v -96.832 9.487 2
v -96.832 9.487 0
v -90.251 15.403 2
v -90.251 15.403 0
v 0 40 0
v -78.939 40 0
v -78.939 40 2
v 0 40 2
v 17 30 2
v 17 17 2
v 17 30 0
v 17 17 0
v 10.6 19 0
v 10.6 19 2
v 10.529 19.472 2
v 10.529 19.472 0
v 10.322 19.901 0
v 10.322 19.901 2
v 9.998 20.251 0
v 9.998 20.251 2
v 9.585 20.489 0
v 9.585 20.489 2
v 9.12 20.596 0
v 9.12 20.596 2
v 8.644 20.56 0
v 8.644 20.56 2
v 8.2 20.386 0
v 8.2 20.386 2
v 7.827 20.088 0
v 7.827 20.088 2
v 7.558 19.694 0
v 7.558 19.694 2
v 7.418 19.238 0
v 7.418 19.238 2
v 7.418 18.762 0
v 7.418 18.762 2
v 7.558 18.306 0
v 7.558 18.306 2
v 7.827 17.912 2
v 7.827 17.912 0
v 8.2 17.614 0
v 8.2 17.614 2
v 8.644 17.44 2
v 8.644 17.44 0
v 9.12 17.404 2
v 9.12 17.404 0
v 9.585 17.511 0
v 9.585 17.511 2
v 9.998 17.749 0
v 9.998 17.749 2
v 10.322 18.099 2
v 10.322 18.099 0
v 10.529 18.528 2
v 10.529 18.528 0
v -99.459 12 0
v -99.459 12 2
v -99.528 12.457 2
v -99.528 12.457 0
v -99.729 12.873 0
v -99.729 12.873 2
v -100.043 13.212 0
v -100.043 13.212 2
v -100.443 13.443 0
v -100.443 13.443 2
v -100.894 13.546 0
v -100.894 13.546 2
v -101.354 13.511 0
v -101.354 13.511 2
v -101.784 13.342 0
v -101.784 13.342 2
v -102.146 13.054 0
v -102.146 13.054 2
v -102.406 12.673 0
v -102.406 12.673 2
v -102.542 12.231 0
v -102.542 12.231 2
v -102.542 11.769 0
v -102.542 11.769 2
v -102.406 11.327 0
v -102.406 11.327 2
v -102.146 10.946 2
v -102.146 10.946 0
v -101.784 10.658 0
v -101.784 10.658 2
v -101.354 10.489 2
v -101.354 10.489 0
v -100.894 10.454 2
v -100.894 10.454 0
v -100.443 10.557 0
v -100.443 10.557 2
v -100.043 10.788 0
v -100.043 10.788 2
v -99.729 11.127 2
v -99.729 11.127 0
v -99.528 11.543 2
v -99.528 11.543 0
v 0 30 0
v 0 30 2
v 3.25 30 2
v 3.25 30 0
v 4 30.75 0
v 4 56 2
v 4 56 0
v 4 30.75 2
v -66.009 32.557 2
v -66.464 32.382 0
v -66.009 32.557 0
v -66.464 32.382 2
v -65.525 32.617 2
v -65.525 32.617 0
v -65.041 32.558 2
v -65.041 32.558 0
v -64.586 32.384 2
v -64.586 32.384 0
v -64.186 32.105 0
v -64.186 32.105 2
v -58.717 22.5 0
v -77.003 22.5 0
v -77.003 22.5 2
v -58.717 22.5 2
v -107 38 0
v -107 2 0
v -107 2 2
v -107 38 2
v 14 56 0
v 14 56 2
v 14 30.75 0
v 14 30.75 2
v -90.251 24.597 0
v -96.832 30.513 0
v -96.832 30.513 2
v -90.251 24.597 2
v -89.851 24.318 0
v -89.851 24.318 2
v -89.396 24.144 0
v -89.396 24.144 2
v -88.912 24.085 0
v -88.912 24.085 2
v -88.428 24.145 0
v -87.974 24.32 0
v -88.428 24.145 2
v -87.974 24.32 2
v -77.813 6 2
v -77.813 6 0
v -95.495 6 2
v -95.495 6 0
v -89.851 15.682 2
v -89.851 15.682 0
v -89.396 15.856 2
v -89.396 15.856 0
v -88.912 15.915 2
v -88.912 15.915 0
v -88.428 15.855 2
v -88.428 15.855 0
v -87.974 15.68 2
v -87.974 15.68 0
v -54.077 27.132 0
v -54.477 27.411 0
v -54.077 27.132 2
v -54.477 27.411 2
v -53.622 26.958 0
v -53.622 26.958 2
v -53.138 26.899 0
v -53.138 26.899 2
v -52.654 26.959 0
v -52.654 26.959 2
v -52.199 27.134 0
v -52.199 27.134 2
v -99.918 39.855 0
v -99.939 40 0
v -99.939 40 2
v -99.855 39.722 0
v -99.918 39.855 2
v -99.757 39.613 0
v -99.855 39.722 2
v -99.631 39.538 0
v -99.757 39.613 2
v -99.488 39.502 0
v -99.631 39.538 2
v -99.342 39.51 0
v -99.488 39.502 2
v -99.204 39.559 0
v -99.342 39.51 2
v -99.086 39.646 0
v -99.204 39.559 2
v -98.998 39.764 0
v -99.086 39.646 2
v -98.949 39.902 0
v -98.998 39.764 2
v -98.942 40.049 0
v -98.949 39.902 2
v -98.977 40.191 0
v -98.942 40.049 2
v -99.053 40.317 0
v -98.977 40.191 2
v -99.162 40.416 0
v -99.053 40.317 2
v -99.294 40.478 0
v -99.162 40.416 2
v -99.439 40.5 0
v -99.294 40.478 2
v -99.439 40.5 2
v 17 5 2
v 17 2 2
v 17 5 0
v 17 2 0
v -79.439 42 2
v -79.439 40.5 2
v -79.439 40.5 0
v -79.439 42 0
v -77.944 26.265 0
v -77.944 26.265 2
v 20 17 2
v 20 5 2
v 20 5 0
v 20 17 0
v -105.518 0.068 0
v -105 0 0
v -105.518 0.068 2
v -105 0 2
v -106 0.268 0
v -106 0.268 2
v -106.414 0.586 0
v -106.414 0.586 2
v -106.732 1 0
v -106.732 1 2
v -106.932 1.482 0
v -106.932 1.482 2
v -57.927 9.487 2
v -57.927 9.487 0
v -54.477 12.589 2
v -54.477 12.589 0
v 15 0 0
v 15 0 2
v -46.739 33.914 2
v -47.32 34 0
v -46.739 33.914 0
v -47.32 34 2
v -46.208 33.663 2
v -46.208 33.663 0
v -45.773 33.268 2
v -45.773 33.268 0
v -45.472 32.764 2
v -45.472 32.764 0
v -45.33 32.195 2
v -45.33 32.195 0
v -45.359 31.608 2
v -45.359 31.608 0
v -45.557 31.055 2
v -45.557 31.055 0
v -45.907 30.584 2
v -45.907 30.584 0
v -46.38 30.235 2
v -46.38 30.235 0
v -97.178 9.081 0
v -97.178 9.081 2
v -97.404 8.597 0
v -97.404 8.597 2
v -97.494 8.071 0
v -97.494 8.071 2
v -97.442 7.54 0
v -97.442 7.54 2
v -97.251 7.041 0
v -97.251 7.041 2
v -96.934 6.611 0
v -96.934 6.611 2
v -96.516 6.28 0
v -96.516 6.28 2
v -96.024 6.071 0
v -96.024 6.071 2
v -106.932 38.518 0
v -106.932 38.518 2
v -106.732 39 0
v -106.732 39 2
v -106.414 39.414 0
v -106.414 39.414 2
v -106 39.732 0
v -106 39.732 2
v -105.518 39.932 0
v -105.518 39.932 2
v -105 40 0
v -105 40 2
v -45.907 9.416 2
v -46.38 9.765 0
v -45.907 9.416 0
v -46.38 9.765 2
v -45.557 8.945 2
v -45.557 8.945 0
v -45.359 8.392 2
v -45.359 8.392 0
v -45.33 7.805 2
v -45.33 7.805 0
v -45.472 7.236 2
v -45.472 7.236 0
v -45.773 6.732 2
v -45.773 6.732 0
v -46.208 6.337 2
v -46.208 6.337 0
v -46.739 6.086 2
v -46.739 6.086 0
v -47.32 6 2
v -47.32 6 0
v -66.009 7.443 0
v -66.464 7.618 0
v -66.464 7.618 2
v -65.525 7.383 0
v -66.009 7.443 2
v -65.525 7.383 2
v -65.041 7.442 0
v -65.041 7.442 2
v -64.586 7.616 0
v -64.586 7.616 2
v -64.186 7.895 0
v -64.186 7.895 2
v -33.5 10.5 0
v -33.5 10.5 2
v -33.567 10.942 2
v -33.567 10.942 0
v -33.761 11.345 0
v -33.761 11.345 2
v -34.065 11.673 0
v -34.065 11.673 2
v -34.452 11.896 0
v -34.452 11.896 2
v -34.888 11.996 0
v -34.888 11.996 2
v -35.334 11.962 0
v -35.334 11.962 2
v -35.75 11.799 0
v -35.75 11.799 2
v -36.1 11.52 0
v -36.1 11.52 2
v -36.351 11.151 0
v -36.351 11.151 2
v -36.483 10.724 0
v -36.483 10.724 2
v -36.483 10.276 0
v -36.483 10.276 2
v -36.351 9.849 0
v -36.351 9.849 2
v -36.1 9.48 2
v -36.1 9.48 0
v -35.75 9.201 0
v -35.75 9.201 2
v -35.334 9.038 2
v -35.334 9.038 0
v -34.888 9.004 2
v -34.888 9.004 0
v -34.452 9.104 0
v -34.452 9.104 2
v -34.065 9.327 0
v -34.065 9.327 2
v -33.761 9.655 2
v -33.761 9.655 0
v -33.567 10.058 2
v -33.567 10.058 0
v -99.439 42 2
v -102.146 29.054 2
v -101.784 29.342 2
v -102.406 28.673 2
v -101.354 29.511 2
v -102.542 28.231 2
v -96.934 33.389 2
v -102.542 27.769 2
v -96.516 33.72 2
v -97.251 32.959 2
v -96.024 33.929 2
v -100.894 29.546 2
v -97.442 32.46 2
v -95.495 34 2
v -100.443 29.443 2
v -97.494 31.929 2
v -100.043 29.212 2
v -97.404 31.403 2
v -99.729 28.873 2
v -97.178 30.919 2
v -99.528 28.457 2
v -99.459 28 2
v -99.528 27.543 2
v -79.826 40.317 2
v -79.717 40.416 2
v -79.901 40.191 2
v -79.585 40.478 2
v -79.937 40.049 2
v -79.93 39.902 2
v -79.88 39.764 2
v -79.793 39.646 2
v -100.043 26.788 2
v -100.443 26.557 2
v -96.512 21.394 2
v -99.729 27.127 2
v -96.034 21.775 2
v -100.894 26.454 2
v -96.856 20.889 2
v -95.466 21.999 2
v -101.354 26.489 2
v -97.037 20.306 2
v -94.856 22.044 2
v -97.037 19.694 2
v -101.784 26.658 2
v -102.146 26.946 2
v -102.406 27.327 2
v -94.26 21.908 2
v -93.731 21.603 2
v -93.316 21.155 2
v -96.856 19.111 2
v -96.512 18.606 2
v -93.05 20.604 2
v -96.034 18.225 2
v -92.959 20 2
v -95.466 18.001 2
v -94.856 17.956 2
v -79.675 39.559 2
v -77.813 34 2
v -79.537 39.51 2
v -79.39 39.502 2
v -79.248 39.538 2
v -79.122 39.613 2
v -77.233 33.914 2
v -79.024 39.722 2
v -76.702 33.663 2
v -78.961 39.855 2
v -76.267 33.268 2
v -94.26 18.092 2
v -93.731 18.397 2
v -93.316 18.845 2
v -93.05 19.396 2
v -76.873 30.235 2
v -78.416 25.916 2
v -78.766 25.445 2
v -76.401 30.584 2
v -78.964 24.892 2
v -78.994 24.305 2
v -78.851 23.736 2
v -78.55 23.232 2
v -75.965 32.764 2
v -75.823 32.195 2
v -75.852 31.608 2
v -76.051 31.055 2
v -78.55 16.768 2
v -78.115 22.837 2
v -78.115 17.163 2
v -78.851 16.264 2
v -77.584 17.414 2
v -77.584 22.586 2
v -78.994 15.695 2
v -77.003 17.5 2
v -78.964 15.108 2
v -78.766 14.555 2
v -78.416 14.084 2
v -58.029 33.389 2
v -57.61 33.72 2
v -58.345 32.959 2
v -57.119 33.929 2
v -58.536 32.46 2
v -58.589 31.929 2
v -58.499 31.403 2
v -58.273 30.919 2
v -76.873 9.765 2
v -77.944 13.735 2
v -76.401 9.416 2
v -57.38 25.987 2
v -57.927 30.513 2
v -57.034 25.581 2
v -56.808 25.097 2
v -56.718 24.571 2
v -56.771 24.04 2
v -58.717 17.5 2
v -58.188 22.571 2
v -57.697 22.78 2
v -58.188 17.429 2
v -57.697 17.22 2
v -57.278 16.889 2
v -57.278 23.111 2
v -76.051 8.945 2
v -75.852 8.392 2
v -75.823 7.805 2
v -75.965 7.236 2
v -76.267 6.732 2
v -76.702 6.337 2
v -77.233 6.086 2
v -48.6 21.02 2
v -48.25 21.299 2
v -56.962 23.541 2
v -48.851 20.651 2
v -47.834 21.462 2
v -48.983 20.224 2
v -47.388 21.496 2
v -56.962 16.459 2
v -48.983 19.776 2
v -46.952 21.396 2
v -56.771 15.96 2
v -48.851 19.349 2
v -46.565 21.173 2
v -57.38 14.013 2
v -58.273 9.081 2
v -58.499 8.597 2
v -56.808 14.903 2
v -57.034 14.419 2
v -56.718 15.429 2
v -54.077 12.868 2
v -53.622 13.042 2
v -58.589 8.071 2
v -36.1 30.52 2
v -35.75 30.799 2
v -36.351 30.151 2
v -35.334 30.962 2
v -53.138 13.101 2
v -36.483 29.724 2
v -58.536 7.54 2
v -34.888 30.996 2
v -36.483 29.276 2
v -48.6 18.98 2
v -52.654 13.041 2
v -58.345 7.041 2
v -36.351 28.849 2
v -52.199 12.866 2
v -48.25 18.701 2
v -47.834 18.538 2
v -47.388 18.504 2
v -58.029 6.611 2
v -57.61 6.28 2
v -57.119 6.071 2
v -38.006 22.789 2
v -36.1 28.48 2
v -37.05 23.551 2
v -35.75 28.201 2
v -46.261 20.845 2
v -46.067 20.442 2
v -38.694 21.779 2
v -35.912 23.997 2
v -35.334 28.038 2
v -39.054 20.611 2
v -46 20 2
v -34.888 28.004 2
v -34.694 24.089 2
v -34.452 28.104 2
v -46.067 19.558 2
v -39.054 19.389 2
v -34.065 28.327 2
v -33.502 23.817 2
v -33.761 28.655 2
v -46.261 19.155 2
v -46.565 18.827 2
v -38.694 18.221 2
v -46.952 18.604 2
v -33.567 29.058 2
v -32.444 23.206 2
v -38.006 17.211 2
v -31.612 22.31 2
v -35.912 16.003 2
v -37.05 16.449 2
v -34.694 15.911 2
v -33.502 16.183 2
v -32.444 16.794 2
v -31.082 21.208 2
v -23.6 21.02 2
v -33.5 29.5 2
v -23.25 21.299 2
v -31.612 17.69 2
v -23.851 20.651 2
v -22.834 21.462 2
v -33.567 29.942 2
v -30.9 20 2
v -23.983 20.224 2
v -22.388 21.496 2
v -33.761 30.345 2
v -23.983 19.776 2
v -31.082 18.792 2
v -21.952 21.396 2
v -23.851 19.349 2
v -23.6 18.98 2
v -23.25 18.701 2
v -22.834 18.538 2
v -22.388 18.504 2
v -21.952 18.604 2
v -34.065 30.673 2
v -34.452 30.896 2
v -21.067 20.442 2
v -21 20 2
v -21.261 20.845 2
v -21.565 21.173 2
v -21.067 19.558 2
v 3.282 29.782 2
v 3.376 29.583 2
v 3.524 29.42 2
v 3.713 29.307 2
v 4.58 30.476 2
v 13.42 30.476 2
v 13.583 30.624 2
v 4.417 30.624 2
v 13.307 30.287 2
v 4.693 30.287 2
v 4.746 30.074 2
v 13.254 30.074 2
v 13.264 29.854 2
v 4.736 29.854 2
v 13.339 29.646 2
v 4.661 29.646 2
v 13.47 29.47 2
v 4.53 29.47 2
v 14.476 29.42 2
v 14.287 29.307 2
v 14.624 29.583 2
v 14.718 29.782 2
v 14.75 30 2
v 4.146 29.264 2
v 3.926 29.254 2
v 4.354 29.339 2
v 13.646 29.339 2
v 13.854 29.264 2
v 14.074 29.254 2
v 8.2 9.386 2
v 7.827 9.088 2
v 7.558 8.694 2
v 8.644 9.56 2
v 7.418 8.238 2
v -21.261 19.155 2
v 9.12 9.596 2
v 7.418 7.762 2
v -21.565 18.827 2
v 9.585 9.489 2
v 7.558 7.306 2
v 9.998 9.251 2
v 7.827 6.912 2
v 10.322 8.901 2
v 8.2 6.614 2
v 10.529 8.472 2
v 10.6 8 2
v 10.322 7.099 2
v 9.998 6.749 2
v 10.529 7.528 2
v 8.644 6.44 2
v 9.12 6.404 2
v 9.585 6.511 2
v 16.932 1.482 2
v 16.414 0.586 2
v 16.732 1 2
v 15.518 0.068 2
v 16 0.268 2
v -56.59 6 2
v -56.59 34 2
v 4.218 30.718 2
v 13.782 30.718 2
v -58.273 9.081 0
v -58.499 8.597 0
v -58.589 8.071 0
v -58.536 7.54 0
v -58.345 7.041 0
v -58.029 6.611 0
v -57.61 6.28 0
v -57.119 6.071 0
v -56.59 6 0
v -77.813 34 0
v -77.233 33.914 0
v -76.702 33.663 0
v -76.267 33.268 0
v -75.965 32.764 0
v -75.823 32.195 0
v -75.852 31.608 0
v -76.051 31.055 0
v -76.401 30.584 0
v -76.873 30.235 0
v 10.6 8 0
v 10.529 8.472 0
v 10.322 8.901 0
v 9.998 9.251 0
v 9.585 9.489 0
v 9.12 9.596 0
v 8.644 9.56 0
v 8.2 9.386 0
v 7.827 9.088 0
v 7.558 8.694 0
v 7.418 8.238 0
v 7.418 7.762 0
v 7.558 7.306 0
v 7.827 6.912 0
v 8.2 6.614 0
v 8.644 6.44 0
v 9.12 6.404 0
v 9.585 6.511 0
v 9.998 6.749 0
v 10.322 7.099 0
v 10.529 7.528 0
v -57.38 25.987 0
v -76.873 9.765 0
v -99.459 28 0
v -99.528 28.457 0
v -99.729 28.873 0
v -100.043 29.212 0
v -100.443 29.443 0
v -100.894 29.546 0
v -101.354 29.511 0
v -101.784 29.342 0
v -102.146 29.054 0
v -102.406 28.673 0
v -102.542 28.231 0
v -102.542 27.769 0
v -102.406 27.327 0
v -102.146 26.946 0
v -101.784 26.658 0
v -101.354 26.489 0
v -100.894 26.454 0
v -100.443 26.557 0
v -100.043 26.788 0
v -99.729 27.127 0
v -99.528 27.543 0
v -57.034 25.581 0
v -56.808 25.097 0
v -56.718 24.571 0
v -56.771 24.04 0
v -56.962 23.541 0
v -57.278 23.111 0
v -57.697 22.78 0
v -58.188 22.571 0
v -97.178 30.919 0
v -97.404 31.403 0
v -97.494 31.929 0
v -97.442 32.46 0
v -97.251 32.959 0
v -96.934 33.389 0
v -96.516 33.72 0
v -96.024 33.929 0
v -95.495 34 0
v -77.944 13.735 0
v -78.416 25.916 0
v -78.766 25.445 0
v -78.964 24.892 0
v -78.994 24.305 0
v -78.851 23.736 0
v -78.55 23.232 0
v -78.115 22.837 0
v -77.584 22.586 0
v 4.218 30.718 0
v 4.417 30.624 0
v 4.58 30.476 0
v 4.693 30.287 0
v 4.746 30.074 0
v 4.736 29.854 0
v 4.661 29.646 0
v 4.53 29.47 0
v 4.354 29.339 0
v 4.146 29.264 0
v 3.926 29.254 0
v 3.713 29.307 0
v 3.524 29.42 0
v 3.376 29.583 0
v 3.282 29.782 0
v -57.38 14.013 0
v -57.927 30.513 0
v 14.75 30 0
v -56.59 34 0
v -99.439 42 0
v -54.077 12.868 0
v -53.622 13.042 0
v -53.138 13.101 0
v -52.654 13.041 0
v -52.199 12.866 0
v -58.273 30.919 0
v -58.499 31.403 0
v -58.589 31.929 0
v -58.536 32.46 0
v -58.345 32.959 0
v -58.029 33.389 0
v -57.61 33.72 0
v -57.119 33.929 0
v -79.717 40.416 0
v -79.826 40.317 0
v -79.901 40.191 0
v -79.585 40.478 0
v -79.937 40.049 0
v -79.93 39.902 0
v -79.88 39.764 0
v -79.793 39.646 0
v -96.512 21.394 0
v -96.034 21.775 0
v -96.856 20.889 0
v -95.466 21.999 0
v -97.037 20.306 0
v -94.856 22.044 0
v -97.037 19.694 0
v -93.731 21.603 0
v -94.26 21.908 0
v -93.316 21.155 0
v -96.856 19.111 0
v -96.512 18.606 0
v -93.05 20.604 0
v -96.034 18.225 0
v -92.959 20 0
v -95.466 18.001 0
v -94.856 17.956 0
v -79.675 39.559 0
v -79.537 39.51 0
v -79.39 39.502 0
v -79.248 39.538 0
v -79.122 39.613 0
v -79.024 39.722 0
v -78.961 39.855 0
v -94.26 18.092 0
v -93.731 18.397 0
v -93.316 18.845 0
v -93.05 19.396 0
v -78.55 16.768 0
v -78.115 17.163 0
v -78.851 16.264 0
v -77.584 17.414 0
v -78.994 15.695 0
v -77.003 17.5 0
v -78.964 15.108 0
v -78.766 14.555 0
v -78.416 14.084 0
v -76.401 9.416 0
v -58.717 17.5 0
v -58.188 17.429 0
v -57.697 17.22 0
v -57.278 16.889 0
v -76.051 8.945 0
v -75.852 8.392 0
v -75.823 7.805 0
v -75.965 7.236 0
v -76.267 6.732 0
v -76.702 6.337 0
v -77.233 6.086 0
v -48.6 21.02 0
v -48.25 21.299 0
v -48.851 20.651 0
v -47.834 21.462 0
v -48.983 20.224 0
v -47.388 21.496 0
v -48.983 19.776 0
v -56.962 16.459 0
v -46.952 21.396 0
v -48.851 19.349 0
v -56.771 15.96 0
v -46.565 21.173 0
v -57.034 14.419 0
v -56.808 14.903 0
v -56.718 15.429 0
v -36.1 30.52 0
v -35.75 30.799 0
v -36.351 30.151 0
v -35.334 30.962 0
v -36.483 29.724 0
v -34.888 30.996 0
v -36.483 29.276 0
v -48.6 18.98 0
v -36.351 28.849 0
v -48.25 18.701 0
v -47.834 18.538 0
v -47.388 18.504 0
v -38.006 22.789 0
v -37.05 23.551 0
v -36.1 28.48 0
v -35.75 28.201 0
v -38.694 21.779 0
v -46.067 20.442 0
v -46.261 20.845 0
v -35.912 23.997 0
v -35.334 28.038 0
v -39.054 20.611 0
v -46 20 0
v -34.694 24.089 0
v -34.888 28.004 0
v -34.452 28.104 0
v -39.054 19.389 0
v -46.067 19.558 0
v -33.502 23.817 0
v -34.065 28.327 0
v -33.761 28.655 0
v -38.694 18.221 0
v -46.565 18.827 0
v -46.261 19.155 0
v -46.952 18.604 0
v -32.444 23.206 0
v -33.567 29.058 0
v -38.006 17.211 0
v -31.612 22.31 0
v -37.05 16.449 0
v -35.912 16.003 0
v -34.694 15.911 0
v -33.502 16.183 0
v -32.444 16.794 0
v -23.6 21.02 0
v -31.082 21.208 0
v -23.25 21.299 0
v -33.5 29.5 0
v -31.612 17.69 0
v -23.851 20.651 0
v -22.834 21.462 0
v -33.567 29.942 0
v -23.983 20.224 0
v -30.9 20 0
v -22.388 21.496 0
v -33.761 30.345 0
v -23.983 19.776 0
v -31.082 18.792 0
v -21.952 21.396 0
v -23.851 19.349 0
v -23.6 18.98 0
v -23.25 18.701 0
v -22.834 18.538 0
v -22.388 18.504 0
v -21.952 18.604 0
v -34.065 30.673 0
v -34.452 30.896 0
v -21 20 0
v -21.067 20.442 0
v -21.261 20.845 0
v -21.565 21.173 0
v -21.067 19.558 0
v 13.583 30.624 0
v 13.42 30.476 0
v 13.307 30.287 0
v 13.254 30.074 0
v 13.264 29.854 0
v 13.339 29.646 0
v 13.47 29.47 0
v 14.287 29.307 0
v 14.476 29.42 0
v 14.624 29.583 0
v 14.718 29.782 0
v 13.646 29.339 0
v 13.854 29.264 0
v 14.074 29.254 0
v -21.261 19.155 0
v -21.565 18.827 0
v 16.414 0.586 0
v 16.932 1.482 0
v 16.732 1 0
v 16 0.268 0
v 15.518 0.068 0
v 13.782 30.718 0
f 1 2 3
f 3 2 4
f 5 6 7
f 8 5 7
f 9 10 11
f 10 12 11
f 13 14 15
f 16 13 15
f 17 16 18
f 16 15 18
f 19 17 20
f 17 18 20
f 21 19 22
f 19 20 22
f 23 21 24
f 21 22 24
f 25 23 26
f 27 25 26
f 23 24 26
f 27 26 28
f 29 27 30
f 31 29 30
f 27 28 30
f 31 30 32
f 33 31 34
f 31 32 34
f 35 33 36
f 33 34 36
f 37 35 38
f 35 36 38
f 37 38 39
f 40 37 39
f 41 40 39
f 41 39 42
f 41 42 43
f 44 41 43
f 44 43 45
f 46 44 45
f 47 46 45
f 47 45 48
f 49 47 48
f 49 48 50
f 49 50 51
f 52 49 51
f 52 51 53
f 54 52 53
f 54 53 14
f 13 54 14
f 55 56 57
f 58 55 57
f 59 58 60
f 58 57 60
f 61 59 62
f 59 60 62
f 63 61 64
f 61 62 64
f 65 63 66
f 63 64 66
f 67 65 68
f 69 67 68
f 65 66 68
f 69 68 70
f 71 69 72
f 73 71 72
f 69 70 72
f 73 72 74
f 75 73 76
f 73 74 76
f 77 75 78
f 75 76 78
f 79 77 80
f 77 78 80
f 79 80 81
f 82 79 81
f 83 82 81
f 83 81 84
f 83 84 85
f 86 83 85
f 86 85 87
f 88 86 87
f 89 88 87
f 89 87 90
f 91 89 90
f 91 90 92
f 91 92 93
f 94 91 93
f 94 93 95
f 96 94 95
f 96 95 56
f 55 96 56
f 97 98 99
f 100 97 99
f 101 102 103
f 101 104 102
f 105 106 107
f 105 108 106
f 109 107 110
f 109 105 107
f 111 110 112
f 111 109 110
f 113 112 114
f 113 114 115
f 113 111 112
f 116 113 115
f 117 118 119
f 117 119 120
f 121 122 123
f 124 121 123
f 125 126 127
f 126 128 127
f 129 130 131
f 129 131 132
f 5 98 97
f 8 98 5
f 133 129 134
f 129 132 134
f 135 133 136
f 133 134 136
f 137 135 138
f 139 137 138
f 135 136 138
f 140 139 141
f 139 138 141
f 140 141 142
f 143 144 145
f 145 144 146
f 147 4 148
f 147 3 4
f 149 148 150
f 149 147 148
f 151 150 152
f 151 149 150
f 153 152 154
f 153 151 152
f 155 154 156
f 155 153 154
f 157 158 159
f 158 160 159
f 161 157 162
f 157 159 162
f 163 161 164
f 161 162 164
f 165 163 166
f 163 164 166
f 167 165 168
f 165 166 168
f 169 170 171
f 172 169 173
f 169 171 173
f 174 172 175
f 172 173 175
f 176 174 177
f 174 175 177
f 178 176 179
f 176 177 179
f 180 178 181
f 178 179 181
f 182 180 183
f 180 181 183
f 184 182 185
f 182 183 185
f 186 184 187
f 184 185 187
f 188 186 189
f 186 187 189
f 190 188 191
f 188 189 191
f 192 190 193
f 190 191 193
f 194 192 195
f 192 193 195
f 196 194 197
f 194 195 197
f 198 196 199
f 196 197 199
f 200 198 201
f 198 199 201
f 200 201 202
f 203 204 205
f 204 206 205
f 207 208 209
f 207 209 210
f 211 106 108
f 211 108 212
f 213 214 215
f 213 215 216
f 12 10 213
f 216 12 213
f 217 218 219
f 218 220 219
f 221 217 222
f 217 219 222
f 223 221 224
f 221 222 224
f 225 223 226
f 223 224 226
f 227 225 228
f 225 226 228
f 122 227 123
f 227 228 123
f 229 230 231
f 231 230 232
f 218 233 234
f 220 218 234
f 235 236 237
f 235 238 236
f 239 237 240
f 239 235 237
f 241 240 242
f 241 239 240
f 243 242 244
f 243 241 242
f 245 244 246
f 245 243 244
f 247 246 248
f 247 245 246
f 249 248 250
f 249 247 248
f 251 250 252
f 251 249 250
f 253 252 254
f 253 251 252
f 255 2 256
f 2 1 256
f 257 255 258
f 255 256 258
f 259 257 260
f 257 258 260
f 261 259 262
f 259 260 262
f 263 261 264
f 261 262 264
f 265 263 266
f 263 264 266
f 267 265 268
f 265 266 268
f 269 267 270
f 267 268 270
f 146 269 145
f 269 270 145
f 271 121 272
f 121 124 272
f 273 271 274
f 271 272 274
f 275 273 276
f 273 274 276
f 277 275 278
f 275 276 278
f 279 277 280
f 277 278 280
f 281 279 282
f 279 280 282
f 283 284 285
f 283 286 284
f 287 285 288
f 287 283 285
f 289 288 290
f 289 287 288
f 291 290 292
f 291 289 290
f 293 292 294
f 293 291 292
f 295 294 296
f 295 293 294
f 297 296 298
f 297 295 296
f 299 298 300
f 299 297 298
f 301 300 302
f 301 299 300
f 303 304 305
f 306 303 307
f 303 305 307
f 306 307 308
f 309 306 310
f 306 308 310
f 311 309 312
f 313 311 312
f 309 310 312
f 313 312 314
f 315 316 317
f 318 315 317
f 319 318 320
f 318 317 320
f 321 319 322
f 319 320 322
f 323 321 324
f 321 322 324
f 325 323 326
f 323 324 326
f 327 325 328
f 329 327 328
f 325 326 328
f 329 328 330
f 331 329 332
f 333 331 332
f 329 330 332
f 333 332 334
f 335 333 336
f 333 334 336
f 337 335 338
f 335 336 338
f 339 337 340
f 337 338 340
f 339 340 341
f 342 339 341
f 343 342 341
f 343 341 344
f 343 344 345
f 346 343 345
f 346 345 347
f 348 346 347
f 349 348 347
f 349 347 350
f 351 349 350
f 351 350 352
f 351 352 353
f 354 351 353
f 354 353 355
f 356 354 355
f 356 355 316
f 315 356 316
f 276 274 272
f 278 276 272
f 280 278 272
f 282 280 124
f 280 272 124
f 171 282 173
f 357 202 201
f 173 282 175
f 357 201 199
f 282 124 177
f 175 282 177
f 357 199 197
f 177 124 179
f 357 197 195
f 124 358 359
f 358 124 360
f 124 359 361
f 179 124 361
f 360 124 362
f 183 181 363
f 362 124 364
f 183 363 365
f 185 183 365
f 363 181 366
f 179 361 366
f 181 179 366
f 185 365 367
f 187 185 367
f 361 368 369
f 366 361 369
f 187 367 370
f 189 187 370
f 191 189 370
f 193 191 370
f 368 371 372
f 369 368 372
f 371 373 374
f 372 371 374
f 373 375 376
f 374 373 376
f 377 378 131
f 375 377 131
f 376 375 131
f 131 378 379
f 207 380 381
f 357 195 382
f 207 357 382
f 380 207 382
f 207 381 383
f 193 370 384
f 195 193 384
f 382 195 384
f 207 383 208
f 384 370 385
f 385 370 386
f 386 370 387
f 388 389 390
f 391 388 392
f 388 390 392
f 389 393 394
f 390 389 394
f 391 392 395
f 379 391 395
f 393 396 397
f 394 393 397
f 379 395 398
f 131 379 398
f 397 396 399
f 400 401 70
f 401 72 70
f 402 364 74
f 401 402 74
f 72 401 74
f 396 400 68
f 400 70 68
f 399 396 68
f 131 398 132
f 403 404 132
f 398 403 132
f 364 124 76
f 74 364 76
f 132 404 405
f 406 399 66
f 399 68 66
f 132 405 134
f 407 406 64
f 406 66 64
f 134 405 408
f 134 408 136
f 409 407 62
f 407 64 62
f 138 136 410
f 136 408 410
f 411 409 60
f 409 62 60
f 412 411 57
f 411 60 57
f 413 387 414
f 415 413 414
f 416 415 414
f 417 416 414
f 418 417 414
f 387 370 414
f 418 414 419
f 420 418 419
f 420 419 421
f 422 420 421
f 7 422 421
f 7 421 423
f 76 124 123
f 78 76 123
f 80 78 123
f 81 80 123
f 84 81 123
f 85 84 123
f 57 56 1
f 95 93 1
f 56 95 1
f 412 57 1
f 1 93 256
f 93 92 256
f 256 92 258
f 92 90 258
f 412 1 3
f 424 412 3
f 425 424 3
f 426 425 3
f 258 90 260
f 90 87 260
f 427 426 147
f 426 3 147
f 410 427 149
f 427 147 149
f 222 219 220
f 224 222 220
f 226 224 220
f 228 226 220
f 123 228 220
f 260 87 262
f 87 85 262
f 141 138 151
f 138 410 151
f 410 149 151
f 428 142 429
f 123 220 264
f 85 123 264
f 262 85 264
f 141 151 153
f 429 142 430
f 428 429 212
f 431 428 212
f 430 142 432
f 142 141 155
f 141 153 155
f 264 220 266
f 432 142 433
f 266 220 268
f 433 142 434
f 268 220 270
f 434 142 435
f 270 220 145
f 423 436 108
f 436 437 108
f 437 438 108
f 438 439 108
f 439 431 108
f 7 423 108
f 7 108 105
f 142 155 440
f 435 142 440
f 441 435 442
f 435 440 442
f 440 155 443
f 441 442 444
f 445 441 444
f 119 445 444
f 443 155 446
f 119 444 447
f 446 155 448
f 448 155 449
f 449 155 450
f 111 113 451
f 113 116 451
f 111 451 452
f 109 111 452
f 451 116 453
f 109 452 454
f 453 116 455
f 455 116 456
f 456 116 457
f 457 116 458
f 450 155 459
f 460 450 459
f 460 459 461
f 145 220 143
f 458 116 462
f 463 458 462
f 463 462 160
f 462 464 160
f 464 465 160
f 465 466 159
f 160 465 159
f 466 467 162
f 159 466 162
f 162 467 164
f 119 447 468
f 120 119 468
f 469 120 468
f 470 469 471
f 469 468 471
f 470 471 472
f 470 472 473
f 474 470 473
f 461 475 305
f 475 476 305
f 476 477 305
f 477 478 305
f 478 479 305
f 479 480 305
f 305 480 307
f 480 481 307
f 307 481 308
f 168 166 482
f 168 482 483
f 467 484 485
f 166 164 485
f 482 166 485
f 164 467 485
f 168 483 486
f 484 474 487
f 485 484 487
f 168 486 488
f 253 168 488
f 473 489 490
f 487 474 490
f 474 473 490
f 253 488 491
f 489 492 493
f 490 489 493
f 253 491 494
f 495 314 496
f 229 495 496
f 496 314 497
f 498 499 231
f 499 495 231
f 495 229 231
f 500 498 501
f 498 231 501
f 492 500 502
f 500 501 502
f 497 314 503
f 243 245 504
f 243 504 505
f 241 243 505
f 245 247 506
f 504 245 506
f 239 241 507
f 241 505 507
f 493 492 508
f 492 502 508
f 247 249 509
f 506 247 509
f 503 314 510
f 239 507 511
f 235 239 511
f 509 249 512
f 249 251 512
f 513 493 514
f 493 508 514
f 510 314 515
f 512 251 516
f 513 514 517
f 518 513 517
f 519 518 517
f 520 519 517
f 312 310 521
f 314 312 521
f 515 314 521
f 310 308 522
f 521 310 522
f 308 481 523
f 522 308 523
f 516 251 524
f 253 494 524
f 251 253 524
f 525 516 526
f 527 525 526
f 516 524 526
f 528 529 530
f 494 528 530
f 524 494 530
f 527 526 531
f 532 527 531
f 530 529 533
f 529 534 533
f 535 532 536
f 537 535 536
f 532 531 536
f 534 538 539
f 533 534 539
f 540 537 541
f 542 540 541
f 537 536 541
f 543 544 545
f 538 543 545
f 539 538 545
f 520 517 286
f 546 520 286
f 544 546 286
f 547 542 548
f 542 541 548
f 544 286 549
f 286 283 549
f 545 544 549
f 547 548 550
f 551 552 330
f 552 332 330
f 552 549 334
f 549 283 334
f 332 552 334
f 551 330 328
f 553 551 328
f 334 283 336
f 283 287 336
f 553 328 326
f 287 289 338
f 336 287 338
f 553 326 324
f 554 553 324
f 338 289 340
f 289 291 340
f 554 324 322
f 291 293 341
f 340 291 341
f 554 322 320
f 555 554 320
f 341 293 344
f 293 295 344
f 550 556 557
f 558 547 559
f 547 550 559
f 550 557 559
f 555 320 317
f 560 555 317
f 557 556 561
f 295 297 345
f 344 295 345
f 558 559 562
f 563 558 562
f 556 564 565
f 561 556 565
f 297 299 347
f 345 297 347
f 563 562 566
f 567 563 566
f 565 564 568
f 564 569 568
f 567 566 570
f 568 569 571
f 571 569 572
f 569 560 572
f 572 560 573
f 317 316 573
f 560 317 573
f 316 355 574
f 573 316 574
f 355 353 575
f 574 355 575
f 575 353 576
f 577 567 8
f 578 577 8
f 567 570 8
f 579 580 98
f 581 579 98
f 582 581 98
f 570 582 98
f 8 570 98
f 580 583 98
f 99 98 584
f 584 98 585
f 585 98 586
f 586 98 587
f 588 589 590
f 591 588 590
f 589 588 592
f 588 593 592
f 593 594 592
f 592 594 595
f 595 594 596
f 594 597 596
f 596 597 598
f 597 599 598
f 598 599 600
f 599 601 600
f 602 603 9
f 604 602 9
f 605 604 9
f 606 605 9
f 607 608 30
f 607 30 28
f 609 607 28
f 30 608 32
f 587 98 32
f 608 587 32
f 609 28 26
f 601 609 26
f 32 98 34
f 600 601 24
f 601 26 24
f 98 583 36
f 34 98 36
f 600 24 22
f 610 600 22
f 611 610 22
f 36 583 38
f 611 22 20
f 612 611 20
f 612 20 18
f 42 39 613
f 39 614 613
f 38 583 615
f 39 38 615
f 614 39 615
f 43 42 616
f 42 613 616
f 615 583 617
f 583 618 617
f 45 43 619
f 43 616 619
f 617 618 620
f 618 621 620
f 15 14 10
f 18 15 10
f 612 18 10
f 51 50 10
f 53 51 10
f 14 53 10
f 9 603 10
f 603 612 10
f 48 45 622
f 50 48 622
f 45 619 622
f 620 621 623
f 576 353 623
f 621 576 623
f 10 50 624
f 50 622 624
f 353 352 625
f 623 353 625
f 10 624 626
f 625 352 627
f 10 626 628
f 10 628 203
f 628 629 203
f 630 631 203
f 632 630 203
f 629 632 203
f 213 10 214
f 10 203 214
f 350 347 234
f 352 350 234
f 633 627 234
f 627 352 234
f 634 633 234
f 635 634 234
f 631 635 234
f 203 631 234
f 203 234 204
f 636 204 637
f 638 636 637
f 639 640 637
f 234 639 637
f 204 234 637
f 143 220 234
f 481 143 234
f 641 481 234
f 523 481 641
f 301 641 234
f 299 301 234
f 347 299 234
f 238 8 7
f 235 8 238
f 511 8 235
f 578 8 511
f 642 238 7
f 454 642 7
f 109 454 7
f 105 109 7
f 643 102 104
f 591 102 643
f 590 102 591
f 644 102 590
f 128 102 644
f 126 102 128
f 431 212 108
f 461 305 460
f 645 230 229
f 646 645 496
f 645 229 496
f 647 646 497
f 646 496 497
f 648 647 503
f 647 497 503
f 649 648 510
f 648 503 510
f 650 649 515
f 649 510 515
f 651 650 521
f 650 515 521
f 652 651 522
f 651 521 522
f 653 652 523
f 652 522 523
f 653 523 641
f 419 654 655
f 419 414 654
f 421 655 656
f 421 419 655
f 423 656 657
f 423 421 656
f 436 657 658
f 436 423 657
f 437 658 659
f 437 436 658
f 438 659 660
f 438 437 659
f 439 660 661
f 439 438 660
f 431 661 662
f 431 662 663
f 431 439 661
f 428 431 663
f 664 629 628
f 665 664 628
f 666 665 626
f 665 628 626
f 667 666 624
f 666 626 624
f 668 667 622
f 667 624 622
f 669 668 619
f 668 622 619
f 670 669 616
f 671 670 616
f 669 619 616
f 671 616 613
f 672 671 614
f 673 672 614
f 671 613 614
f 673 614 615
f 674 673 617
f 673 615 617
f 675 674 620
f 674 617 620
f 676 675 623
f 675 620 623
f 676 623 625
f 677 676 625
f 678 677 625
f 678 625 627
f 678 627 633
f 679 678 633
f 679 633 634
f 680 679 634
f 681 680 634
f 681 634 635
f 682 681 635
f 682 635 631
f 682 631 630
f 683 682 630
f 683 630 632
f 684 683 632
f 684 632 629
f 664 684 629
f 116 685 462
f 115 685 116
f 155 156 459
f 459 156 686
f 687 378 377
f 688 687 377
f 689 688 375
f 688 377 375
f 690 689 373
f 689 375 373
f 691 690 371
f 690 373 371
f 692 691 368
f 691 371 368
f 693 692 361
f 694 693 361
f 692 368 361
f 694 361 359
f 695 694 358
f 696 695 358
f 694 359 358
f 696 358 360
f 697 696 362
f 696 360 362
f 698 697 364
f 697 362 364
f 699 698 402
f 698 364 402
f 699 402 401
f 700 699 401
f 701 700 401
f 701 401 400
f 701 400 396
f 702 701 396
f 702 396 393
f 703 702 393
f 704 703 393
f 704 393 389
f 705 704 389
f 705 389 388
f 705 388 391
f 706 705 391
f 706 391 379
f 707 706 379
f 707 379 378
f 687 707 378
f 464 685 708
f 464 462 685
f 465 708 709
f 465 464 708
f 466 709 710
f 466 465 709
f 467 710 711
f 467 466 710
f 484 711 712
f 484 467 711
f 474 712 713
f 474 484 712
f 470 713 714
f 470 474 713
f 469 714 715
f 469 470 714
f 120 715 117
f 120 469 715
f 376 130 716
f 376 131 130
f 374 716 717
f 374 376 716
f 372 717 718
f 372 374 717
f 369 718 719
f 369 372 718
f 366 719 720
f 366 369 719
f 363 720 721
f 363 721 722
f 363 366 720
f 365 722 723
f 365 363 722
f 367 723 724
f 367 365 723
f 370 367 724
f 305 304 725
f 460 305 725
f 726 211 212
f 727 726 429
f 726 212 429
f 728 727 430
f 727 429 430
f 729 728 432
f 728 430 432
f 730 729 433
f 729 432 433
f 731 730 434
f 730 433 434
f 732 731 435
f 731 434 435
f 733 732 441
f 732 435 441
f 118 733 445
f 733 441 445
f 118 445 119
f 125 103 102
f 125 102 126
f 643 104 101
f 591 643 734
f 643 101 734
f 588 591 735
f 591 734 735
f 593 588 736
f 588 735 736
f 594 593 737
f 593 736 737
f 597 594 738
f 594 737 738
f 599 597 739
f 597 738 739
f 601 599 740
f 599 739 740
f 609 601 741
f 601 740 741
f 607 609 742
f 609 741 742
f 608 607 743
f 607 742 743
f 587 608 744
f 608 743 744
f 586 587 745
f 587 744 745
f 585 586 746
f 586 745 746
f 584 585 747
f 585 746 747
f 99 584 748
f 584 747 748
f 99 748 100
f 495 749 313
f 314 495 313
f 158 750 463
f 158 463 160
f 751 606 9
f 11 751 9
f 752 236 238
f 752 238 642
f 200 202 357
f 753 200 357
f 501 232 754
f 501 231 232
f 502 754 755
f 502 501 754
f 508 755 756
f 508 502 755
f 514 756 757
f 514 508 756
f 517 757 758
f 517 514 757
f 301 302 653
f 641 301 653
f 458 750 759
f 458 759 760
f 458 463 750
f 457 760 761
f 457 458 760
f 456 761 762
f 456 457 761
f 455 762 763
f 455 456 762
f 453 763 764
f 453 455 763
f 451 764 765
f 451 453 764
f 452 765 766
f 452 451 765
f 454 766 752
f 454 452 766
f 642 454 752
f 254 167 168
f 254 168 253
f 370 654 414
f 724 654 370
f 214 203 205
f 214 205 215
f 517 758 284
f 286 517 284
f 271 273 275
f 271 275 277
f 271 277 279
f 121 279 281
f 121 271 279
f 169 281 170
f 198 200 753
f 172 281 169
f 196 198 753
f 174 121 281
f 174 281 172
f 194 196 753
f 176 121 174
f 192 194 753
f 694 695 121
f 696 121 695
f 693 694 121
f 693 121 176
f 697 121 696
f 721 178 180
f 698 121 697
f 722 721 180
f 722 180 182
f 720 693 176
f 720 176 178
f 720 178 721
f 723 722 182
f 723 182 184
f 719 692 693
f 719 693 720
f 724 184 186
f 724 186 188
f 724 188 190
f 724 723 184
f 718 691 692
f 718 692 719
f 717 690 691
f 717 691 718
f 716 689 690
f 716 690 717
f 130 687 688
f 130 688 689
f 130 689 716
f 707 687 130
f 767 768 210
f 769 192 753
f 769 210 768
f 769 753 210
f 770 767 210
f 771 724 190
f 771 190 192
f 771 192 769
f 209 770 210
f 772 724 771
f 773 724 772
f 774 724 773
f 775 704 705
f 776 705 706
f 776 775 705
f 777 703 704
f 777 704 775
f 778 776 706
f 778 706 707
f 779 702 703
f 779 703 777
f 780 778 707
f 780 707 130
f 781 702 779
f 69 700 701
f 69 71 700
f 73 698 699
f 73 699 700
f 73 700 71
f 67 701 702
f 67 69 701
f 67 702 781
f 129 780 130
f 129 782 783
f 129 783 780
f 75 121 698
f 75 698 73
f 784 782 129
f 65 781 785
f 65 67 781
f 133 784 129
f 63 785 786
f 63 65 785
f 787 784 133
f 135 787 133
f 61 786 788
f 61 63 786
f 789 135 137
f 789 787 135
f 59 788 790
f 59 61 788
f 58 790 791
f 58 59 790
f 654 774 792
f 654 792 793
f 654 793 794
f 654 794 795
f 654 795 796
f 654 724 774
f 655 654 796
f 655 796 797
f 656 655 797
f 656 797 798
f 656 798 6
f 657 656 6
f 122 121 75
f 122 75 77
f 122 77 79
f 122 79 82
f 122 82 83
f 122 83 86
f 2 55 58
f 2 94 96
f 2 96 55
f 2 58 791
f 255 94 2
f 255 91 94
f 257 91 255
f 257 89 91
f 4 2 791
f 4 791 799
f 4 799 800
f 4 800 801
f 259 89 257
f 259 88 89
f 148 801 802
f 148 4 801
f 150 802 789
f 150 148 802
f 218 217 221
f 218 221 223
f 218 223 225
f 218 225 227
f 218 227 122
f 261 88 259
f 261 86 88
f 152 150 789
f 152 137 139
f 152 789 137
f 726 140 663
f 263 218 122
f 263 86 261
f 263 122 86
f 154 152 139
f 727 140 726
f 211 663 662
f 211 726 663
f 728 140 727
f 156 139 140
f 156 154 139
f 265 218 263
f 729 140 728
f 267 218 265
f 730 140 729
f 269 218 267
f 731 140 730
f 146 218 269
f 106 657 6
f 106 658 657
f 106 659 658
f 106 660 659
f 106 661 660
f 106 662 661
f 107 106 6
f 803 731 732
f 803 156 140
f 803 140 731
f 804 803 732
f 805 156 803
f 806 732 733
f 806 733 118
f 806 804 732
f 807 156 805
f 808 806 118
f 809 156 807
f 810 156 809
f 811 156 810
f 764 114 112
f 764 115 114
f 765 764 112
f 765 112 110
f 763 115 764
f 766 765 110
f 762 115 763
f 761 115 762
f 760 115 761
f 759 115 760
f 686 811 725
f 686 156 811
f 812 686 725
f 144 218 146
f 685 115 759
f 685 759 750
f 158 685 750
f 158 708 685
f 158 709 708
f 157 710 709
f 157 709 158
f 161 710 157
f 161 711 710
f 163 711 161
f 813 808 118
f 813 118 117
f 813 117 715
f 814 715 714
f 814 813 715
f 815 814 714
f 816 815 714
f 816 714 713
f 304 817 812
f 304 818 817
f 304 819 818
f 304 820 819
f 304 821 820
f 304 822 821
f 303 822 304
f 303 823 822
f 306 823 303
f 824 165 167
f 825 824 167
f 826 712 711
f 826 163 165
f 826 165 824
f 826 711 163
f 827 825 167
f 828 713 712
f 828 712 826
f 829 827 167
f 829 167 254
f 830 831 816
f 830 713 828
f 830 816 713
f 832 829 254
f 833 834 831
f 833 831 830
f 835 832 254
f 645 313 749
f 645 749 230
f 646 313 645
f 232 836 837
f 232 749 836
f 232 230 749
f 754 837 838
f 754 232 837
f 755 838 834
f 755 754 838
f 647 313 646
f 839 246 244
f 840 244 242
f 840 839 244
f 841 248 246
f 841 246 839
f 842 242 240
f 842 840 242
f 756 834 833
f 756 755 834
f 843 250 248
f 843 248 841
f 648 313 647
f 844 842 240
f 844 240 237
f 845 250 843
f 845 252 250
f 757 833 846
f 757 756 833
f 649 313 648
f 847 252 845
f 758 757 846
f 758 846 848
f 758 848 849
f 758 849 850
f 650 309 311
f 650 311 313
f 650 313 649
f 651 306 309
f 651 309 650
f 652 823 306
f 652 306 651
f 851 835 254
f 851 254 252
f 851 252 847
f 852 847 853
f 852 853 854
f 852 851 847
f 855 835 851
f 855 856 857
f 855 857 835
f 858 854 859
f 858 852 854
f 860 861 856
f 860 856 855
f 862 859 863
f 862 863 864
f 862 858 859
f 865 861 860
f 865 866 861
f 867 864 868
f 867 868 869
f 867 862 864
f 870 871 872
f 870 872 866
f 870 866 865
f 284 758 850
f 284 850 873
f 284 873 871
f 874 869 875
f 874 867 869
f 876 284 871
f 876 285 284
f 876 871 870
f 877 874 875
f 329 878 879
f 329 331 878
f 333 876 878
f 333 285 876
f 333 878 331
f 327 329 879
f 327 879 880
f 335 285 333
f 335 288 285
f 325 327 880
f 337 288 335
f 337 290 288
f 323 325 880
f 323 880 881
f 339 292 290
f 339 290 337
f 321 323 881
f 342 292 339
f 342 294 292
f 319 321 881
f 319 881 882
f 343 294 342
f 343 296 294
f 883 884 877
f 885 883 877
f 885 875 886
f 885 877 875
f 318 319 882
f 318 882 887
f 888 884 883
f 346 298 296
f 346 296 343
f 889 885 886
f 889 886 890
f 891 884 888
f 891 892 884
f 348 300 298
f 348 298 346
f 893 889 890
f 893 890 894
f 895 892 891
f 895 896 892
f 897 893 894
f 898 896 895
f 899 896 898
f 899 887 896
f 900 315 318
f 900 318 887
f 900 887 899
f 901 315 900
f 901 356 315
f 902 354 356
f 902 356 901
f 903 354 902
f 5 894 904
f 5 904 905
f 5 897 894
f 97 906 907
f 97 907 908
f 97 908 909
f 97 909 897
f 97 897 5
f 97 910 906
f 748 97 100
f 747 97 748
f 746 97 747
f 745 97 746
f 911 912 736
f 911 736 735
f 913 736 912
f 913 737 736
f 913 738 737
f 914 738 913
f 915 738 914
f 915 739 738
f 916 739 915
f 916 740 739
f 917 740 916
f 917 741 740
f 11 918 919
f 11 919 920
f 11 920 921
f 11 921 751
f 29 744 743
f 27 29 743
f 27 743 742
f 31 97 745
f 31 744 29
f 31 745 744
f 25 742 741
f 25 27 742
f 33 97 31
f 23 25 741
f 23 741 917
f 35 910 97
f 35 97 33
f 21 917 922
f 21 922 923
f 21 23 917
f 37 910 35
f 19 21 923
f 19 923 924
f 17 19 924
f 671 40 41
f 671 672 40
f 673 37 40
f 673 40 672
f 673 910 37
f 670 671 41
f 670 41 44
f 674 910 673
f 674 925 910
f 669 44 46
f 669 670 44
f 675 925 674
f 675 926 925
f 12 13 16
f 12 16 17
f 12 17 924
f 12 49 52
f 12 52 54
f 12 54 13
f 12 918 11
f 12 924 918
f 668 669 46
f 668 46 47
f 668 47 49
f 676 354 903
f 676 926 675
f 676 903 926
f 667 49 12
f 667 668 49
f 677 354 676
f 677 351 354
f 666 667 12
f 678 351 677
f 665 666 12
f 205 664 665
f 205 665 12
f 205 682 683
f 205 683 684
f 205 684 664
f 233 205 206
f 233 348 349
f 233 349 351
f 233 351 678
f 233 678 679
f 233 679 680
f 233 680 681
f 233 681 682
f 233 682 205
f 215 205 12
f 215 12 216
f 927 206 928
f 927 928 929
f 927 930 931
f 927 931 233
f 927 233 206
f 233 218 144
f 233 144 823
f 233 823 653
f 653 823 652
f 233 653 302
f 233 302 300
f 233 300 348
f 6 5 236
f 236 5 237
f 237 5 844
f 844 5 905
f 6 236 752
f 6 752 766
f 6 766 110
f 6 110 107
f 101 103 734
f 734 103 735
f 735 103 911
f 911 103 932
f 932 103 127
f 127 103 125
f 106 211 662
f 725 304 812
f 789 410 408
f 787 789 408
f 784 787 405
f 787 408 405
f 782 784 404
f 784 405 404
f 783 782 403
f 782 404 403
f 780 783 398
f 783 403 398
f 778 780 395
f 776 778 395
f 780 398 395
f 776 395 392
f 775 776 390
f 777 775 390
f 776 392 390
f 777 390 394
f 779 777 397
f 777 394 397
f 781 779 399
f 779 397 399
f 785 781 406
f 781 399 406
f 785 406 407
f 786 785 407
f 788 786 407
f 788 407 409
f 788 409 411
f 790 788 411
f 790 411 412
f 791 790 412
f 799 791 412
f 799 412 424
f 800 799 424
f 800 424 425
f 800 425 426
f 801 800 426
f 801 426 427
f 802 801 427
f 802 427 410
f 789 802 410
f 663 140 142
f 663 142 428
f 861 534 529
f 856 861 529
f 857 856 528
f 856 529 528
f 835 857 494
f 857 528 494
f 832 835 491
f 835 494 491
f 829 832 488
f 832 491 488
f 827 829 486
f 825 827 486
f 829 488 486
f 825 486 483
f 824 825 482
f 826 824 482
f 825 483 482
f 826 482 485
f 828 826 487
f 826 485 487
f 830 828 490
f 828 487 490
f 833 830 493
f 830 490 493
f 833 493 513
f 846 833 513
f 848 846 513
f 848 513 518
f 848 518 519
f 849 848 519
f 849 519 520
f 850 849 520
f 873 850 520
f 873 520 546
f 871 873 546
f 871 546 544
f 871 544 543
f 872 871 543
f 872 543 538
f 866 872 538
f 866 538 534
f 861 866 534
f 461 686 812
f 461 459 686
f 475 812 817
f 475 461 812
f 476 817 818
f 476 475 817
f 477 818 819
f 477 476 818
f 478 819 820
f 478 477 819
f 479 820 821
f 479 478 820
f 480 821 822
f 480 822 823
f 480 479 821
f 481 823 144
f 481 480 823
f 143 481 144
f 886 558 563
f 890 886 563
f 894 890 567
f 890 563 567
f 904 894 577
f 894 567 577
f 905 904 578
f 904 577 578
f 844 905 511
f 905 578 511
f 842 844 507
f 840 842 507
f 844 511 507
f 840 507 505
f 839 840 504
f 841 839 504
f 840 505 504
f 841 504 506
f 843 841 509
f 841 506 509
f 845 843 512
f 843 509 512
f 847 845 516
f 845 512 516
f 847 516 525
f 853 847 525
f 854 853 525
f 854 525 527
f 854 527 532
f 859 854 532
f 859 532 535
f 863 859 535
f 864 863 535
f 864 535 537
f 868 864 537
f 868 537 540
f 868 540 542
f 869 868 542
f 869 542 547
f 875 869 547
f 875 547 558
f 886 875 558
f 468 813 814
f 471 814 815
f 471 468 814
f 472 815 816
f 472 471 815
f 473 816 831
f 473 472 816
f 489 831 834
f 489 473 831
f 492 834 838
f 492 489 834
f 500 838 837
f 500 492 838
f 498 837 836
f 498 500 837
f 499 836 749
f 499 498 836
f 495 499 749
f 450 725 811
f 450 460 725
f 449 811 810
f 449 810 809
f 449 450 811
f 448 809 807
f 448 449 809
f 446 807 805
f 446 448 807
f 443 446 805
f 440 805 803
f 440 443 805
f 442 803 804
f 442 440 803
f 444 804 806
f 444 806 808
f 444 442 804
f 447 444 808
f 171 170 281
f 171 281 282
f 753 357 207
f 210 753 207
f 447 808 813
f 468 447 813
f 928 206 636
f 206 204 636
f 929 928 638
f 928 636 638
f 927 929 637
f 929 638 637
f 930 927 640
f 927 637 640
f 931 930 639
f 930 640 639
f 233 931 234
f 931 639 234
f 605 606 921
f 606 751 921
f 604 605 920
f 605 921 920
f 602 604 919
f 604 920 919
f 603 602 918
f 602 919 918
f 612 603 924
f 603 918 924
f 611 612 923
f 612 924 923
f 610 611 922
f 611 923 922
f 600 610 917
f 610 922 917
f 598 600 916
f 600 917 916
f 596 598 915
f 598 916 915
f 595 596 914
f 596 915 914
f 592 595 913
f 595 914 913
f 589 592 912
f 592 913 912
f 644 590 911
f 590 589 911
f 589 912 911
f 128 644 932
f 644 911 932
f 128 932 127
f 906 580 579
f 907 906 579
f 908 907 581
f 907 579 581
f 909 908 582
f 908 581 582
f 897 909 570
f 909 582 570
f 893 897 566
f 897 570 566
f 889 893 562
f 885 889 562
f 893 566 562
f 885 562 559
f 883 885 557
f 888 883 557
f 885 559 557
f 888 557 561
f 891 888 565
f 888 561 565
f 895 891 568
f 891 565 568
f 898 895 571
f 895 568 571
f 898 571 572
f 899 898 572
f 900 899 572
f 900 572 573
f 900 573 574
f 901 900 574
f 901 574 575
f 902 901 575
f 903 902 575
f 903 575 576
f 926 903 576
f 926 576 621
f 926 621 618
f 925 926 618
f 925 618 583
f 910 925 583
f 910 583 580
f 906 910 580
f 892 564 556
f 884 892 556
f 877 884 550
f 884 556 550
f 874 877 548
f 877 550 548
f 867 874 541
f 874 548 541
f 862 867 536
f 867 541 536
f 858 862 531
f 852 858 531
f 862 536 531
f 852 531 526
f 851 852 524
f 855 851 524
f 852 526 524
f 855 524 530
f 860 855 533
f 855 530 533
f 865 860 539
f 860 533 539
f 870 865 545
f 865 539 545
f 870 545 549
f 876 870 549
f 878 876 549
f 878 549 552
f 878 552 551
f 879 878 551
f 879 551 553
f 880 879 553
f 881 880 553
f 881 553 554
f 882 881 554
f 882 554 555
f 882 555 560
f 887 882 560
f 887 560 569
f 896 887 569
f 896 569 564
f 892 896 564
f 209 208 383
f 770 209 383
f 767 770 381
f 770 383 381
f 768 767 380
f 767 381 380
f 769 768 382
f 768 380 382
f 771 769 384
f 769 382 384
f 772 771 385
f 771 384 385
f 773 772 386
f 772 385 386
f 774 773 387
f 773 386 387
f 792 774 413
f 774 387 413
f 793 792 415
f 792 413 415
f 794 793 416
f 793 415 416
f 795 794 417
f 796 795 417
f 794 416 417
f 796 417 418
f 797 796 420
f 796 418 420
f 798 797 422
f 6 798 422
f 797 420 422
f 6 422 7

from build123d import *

# Parameters (mm, degrees)
EXTRUDE_1_DEPTH      = 2
SKETCH_2_R           = 1.6
CUT_EXTRUDE_1_DEPTH  = 3
SKETCH_3_W           = 3
SKETCH_3_H           = 24
SKETCH_3_W_2         = 4
CUT_EXTRUDE_2_DEPTH  = 3
SKETCH_4_W           = 3
SKETCH_4_H           = 12
CUT_EXTRUDE_3_DEPTH  = 3
SKETCH_5_W           = 83
SKETCH_5_H           = 30
EXTRUDE_2_DEPTH      = 2
SKETCH_6_R           = 4.1
CUT_EXTRUDE_4_DEPTH  = 3
SKETCH_7_W           = 83
SKETCH_7_H           = 10
EXTRUDE_4_DEPTH      = 2
SKETCH_8_R           = 1.5
CUT_EXTRUDE_5_DEPTH  = 10
SKETCH_13_W          = 2
SKETCH_13_H          = 40
EXTRUDE_6_DEPTH      = 24
SKETCH_16_R          = 0.75
CUT_EXTRUDE_9_DEPTH  = 3
SKETCH_17_W          = 10
SKETCH_17_H          = 2
EXTRUDE_8_DEPTH      = 2
SKETCH_18_W          = 20
SKETCH_18_H          = 2
EXTRUDE_9_DEPTH      = 2
SKETCH_19_R          = 1.55
SKETCH_19_R_2        = 2.05
CUT_EXTRUDE_10_DEPTH = 10
FILLET_1_R           = 2
CUT_EXTRUDE_11_DEPTH = 10
FILLET_2_R           = 2
SKETCH_22_W          = 3
SKETCH_22_H          = 12
EXTRUDE_10_DEPTH     = 2
SKETCH_23_R          = 0.5
CUT_EXTRUDE_12_DEPTH = 10


with BuildPart() as part:
    # 草图1 → 凸台-拉伸1 (new body)
    with BuildSketch(Plane.XY):
        Polygon((0, 0), (17, 0), (17, 5), (20, 5), (20, 17), (17, 17), (17, 54), (0, 54), align=None)
    extrude(amount=EXTRUDE_1_DEPTH)

    # 草图2 → 切除-拉伸1 (cut, through all)
    with BuildSketch(Plane.XY.offset(2)):
        with Locations((9, 8)):
            Circle(SKETCH_2_R)
        with Locations((9, 19)):
            Circle(SKETCH_2_R)
    extrude(amount=-CUT_EXTRUDE_1_DEPTH, mode=Mode.SUBTRACT)

    # 草图3 → 切除-拉伸2 (cut, through all)
    with BuildSketch(Plane.XY.offset(2)):
        with Locations((15.5, 42)):
            Rectangle(SKETCH_3_W, SKETCH_3_H)
        with Locations((2, 42)):
            Rectangle(SKETCH_3_W_2, SKETCH_3_H)
    extrude(amount=-CUT_EXTRUDE_2_DEPTH, mode=Mode.SUBTRACT)

    # 草图4 → 切除-拉伸3 (cut, through all)
    with BuildSketch(Plane.XY.offset(2)):
        with Locations((18.5, 11)):
            Rectangle(SKETCH_4_W, SKETCH_4_H)
    extrude(amount=-CUT_EXTRUDE_3_DEPTH, mode=Mode.SUBTRACT)

    # 草图5 → 凸台-拉伸2 (add, through all)
    with BuildSketch(Plane.XY.offset(2)):
        with Locations((-41.5, 15)):
            Rectangle(SKETCH_5_W, SKETCH_5_H)
    extrude(amount=-EXTRUDE_2_DEPTH)

    # 草图6 → 切除-拉伸4 (cut, through all)
    with BuildSketch(Plane.XY.offset(2)):
        with Locations((-35, 20)):
            Circle(SKETCH_6_R)
    extrude(amount=-CUT_EXTRUDE_4_DEPTH, mode=Mode.SUBTRACT)

    # 草图7 → 凸台-拉伸4 (add, through all)
    with BuildSketch(Plane.XY.offset(2)):
        with Locations((-41.5, 35)):
            Rectangle(SKETCH_7_W, SKETCH_7_H)
    extrude(amount=-EXTRUDE_4_DEPTH)

    # 草图8 → 切除-拉伸5 (cut)
    with BuildSketch(Plane.XY.offset(2)):
        with Locations((-35, 29.5)):
            Circle(SKETCH_8_R)
        with Locations((-35, 10.5)):
            Circle(SKETCH_8_R)
        with Locations((-47.5, 20)):
            Circle(SKETCH_8_R)
        with Locations((-22.5, 20)):
            Circle(SKETCH_8_R)
    extrude(amount=-CUT_EXTRUDE_5_DEPTH, mode=Mode.SUBTRACT)

    # 草图13 → 凸台-拉伸6 (add)
    with BuildSketch(Plane.ZY.offset(83)):
        with Locations((1, 20)):
            Rectangle(SKETCH_13_W, SKETCH_13_H)
    extrude(amount=EXTRUDE_6_DEPTH)

    # 草图16 → 切除-拉伸9 (cut)
    with BuildSketch(Plane(origin=(0, 0, 0), x_dir=(-1, 0, 0), z_dir=(0, 0, -1))):
        with Locations((-4, 30)):
            Circle(SKETCH_16_R)
        with Locations((-14, 30)):
            Circle(SKETCH_16_R)
    extrude(amount=-CUT_EXTRUDE_9_DEPTH, mode=Mode.SUBTRACT)

    # 草图17 → 凸台-拉伸8 (add)
    with BuildSketch(Plane(origin=(0, 54, 0), x_dir=(1, 0, 0), z_dir=(0, 1, 0))):
        with Locations((9, -1)):
            Rectangle(SKETCH_17_W, SKETCH_17_H)
    extrude(amount=EXTRUDE_8_DEPTH)

    # 草图18 → 凸台-拉伸9 (add)
    with BuildSketch(Plane.XY.offset(2)):
        with Locations((-89.439408026, 41)):
            Rectangle(SKETCH_18_W, SKETCH_18_H)
    extrude(amount=-EXTRUDE_9_DEPTH)

    # 草图19 → 切除-拉伸10 (cut)
    with BuildSketch(Plane.XY.offset(2)):
        with Locations((-101.009408026, 12)):
            Circle(SKETCH_19_R)
        with Locations((-101.009408026, 28)):
            Circle(SKETCH_19_R)
        with Locations((-95.009408026, 20)):
            Circle(SKETCH_19_R_2)
    extrude(amount=-CUT_EXTRUDE_10_DEPTH, mode=Mode.SUBTRACT)

    # 圆角1
    fillet_1_edges = [part.edges().sort_by_distance(p)[0] for p in [
        (-107, 0, 1),
        (-107, 40, 1),
        (17, 0, 1),
    ]]
    fillet(fillet_1_edges, radius=FILLET_1_R)

    # 草图21 → 切除-拉伸11 (cut)
    with BuildSketch(Plane(origin=(0, 0, 0), x_dir=(-1, 0, 0), z_dir=(0, 0, -1))):
        Polygon((100.712510242, 6), (89.209450959, 16.338708626), (69.80722773, 6), align=None)
        Polygon((65.227917011, 6.959193961), (85.009408026, 17.5), (53.5, 17.5), align=None)
        Polygon((61.80722773, 6), (53.43509819, 13.524694584), (39.313817735, 6), align=None)
        Polygon((53.43509819, 26.475305416), (39.313817735, 34), (61.80722773, 34), align=None)
        Polygon((85.009408026, 22.5), (53.5, 22.5), (65.227917011, 33.040806039), align=None)
        Polygon((89.209450959, 23.661291374), (69.80722773, 34), (100.712510242, 34), align=None)
    extrude(amount=-CUT_EXTRUDE_11_DEPTH, mode=Mode.SUBTRACT)

    # 圆角2
    fillet_2_edges = [part.edges().sort_by_distance(p)[0] for p in [
        (-61.80722773, 6, 1),
        (-39.313817735, 6, 1),
        (-53.43509819, 13.524694584, 1),
        (-65.227917011, 6.959193961, 1),
        (-53.5, 17.5, 1),
        (-85.009408026, 17.5, 1),
        (-65.227917011, 33.040806039, 1),
        (-85.009408026, 22.5, 1),
        (-53.5, 22.5, 1),
        (-61.80722773, 34, 1),
        (-53.43509819, 26.475305416, 1),
        (-39.313817735, 34, 1),
        (-100.712510242, 34, 1),
        (-89.209450959, 23.661291374, 1),
        (-69.80722773, 34, 1),
        (-100.712510242, 6, 1),
        (-69.80722773, 6, 1),
        (-89.209450959, 16.338708626, 1),
    ]]
    fillet(fillet_2_edges, radius=FILLET_2_R)

    # 草图22 → 凸台-拉伸10 (add)
    with BuildSketch(Plane.XY.offset(2)):
        with Locations((18.5, 11)):
            Rectangle(SKETCH_22_W, SKETCH_22_H)
    extrude(amount=-EXTRUDE_10_DEPTH)

    # 草图23 → 切除-拉伸12 (cut)
    with BuildSketch(Plane.XY.offset(2)):
        with Locations((-79.439408026, 40)):
            Circle(SKETCH_23_R)
        with Locations((-99.439408026, 40)):
            Circle(SKETCH_23_R)
    extrude(amount=-CUT_EXTRUDE_12_DEPTH, mode=Mode.SUBTRACT)


solid = part.part
